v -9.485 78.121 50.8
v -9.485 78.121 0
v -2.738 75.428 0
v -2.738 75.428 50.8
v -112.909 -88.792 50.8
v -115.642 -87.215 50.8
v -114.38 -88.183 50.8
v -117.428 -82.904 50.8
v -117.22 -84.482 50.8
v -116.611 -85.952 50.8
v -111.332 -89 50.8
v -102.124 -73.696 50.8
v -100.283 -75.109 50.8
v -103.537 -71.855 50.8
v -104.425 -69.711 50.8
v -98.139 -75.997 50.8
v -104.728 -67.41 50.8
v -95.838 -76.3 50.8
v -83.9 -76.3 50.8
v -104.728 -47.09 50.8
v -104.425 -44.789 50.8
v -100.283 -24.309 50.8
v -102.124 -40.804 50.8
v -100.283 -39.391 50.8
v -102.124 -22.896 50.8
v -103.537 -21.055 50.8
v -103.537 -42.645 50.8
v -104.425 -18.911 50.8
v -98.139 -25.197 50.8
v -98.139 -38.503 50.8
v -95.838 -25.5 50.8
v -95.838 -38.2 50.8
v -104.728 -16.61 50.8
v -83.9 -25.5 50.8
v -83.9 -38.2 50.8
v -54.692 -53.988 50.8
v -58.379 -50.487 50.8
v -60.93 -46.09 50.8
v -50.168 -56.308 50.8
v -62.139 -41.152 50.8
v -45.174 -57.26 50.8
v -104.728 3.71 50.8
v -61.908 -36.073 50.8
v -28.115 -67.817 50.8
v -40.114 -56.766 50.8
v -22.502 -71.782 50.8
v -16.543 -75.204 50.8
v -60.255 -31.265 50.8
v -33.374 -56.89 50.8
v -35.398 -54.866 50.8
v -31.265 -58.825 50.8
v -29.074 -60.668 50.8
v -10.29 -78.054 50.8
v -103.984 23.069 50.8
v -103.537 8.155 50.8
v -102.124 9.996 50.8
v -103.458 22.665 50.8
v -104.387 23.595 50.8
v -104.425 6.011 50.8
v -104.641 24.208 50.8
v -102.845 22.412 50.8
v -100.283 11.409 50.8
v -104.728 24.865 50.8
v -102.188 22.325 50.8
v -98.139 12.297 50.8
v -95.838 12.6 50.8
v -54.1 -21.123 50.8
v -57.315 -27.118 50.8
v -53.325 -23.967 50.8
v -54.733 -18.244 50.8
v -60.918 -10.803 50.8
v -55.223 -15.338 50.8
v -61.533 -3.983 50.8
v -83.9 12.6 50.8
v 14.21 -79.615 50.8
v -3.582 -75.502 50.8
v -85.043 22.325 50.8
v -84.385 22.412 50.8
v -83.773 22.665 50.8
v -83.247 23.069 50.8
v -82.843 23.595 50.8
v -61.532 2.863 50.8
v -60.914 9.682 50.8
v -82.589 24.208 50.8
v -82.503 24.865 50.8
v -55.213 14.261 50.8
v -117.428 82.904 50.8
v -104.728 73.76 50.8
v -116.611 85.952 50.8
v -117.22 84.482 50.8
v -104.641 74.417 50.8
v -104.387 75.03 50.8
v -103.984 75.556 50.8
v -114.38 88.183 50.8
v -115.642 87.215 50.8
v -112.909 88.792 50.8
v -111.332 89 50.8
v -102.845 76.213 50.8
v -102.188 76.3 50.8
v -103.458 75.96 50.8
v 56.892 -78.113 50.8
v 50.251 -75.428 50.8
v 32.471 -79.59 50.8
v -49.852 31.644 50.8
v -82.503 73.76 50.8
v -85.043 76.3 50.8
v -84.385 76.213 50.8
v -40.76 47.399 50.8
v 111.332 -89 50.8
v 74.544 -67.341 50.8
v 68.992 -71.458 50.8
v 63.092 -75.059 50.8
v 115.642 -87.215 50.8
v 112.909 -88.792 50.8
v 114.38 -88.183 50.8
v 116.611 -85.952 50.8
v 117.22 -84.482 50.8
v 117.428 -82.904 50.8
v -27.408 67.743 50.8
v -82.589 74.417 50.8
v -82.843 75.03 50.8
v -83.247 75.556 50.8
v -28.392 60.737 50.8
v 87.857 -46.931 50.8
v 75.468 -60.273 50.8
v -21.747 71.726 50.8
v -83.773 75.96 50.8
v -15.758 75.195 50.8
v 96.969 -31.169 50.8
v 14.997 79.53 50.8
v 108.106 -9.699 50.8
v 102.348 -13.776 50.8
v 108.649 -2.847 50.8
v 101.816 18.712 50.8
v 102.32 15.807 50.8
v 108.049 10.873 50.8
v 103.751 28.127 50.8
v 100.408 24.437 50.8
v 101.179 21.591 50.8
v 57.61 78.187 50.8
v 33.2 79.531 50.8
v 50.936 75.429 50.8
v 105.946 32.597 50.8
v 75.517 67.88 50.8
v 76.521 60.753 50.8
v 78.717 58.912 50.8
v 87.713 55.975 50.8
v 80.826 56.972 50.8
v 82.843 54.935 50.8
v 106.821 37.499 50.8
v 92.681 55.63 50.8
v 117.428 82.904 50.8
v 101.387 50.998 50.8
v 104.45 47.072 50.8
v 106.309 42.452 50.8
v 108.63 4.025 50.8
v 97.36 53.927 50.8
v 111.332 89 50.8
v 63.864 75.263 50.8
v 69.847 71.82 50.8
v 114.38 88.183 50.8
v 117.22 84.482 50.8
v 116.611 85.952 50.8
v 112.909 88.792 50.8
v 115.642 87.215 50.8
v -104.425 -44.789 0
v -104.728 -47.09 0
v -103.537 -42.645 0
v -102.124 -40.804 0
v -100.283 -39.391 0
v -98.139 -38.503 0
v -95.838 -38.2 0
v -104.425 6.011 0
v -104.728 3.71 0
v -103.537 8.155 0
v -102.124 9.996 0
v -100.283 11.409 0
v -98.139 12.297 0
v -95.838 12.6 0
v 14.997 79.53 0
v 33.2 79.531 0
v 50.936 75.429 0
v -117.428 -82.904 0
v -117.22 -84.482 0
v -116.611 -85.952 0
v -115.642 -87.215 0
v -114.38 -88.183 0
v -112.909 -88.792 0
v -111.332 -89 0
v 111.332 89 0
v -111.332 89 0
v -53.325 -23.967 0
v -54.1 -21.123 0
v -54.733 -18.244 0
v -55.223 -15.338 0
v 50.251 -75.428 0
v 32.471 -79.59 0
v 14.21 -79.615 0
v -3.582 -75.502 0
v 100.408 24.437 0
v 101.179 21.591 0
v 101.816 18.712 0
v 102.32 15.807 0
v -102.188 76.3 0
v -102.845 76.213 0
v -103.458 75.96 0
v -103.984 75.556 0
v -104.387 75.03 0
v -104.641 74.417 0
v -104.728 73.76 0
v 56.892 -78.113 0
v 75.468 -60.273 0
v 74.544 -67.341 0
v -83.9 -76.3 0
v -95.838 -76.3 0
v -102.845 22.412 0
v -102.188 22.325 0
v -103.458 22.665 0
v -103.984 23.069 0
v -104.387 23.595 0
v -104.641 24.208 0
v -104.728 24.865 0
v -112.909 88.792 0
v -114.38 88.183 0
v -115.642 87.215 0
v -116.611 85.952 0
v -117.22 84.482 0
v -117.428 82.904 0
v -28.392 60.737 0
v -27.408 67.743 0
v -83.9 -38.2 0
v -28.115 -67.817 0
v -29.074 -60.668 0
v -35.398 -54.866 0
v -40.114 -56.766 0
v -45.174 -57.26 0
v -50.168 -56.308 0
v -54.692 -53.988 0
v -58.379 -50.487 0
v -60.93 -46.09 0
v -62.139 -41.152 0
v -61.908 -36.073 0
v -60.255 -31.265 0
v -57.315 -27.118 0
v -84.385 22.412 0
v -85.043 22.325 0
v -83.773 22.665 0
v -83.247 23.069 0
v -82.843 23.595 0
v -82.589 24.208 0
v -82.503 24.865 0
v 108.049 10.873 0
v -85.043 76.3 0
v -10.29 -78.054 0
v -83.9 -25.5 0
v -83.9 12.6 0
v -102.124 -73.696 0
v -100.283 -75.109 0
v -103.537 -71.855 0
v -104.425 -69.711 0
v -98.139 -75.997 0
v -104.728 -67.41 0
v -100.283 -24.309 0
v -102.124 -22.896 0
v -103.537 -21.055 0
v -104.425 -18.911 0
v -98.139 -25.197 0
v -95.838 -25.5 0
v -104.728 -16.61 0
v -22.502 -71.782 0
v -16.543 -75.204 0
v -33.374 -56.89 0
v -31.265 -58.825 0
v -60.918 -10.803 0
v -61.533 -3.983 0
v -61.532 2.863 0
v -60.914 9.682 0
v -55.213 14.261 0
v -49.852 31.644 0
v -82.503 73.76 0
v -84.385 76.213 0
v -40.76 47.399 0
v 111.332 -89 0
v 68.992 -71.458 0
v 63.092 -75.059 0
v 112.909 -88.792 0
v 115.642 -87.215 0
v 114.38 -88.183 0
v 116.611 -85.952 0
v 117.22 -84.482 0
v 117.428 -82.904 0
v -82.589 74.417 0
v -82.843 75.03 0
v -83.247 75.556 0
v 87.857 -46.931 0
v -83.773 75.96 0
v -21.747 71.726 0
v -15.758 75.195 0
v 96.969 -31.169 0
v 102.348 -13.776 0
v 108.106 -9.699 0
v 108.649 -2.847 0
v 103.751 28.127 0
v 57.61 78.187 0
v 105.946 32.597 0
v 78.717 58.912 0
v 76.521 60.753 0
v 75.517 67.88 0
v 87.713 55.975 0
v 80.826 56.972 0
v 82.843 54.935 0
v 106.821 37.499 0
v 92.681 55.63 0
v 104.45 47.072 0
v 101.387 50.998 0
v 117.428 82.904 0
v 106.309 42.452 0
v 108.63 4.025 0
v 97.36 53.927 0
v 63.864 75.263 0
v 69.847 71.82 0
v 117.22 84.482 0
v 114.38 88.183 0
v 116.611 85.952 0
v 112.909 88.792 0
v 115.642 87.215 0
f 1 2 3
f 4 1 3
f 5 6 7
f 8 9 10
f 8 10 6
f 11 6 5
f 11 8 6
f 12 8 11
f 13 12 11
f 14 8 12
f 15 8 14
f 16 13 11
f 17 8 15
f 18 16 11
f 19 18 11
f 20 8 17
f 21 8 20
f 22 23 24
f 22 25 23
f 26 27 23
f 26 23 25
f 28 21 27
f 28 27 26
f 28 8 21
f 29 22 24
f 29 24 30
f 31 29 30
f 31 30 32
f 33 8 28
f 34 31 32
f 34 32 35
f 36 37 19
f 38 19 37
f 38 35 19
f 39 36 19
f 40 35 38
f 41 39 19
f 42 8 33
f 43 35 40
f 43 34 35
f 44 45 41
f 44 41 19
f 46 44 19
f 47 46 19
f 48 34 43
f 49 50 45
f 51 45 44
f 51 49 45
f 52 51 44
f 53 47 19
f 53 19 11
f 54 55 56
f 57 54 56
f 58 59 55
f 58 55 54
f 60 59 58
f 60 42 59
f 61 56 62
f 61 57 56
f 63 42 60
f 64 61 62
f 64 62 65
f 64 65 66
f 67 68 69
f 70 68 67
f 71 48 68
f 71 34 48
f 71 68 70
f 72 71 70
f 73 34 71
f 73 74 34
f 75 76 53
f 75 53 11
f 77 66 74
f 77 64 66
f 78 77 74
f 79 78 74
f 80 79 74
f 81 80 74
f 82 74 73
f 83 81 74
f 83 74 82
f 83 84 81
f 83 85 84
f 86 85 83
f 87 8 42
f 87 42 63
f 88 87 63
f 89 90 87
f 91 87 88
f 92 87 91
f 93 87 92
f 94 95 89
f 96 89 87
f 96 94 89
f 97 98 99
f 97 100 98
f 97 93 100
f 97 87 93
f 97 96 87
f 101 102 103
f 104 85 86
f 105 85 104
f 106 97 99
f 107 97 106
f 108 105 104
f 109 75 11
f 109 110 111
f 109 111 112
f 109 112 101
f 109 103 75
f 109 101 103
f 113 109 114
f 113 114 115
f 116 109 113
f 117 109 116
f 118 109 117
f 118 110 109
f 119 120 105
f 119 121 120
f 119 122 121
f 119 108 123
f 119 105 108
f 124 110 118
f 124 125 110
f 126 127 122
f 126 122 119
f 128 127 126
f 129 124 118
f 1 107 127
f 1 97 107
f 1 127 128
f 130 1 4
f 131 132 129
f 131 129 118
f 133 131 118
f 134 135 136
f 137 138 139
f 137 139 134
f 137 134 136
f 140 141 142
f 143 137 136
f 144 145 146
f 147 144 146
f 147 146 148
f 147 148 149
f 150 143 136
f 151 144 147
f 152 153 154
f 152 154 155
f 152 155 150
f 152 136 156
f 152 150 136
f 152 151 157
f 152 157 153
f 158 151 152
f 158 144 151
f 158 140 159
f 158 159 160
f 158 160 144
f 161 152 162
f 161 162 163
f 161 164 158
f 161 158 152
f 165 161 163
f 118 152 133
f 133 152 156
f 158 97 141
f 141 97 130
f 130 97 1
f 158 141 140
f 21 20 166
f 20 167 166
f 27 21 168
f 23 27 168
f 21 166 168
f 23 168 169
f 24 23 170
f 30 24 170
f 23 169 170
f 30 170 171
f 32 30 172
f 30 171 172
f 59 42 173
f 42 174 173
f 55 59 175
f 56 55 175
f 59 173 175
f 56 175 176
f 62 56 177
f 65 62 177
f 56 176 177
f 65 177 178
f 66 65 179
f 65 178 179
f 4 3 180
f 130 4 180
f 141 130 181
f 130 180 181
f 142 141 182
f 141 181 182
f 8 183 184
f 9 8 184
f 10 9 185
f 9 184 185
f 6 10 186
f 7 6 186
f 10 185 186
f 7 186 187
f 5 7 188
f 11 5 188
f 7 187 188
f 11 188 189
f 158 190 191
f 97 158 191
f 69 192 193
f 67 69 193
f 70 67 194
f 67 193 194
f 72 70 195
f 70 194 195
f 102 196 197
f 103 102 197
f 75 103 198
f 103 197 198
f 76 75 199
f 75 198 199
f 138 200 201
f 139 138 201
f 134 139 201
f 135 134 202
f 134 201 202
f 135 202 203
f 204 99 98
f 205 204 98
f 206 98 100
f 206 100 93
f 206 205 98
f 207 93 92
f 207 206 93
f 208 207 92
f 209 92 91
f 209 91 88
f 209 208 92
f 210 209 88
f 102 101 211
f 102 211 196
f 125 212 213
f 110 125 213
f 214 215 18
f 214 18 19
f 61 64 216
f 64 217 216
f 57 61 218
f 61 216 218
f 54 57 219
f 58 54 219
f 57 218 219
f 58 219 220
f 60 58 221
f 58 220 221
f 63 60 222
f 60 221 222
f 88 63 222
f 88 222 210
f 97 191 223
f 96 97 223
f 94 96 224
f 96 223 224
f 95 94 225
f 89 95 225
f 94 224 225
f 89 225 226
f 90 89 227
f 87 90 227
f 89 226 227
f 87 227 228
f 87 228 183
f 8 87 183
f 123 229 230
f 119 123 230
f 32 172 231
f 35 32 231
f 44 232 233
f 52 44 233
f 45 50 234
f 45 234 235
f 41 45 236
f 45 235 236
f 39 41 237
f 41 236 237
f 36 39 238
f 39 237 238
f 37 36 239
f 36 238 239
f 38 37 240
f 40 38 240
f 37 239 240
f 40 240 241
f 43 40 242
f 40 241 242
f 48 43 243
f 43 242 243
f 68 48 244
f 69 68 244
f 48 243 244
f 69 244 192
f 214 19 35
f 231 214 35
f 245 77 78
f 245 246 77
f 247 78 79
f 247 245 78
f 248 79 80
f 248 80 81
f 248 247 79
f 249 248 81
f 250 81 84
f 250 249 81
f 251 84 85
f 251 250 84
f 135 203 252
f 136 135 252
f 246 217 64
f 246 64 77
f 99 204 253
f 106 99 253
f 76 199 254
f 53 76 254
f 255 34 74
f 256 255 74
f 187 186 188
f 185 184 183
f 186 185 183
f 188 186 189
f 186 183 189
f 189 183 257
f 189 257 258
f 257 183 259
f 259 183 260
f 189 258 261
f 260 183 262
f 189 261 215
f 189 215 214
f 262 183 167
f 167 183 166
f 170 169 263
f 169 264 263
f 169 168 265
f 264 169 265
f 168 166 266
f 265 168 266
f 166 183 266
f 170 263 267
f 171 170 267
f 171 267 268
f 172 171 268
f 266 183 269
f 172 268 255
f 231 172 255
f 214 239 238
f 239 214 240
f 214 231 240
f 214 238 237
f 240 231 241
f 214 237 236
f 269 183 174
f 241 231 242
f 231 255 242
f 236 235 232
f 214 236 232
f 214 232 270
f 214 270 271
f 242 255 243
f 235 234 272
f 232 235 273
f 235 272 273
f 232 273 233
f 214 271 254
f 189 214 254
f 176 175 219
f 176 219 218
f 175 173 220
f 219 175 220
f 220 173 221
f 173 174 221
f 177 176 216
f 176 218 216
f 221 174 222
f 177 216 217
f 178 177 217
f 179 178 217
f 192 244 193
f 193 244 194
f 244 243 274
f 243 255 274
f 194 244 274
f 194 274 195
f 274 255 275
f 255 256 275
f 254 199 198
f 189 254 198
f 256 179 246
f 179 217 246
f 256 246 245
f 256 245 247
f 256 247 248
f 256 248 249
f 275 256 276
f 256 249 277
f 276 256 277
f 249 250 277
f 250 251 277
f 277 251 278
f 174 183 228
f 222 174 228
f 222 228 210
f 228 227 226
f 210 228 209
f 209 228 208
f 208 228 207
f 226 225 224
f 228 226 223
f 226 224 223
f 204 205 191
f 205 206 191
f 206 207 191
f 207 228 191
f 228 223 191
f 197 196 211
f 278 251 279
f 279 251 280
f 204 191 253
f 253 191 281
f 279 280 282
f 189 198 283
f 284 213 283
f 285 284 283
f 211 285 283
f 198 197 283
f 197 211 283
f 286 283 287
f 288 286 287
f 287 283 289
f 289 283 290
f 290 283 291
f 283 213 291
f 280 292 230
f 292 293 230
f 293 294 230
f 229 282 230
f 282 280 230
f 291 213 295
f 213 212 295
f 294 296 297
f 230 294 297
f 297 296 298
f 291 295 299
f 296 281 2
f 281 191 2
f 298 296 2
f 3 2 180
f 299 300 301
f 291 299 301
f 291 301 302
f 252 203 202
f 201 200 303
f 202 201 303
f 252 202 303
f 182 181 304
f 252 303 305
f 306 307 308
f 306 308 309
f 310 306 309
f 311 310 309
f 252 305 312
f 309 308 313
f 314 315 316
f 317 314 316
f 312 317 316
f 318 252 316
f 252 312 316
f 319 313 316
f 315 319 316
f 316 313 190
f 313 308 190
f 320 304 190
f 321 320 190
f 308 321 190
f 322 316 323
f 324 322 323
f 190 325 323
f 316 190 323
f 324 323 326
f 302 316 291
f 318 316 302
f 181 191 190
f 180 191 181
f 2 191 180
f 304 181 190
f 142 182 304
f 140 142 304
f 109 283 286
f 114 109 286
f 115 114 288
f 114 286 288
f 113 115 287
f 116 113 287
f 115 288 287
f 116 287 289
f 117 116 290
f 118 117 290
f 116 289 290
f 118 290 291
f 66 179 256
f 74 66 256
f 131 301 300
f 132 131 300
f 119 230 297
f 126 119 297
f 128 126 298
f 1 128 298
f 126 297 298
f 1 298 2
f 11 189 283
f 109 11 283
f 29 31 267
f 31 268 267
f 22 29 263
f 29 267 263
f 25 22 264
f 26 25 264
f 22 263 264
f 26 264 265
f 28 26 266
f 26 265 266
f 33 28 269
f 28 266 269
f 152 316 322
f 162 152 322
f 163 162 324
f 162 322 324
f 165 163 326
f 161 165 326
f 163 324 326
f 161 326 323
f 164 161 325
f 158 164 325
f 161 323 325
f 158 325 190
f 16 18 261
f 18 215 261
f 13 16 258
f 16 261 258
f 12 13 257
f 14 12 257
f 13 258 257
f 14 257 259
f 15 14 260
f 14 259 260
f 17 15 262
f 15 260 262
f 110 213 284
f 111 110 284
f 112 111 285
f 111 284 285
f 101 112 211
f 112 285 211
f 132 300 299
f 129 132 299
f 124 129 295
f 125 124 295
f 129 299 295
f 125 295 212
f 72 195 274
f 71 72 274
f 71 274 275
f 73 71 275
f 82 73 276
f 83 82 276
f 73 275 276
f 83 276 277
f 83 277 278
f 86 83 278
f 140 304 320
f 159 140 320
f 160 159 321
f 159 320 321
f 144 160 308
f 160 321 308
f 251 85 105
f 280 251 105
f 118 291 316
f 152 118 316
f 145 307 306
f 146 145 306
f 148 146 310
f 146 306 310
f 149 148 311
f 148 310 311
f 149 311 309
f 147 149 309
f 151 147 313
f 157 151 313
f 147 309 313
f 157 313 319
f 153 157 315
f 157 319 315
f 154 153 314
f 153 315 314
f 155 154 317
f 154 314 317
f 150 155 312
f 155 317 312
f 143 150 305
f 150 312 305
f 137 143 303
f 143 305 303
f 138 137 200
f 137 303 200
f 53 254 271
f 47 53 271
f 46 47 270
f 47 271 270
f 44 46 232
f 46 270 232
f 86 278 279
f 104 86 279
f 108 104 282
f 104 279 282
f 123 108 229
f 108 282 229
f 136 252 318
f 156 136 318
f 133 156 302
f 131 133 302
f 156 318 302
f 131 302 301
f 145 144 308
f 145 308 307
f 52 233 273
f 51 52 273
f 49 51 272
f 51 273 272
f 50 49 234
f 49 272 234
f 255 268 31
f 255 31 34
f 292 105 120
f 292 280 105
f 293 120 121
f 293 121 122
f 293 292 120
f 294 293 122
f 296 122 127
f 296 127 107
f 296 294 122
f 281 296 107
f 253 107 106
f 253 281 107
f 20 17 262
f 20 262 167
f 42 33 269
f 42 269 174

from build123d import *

# Parameters (mm, degrees)
F1_DEPTH = 50.8
F2_W     = 20.828
F2_H     = 38.1
F3_DEPTH = 50.8
F4_W     = 22.225
F4_H     = 53.975
F5_DEPTH = 50.8
F6_R     = 8.89
F7_R     = 2.54


with BuildPart() as f1:
    # F0 (on Top) → F1 (new body)
    with BuildSketch(Plane.XY):
        with BuildLine():
            ThreePointArc((-111.331622, 89), (-115.642145, 87.214523), (-117.427622, 82.904))
            Line((-117.427622, 82.904), (-117.427622, -82.904))
            ThreePointArc((-117.427622, -82.904), (-115.642145, -87.214523), (-111.331622, -89))
            Line((-111.331622, -89), (111.331622, -89))
            ThreePointArc((111.331622, -89), (115.642145, -87.214523), (117.427622, -82.904))
            Line((117.427622, -82.904), (117.427622, 82.904))
            ThreePointArc((117.427622, 82.904), (115.642145, 87.214523), (111.331622, 89))
            Line((111.331622, 89), (-111.331622, 89))
        make_face()
        with BuildLine():
            ThreePointArc((-60.918022, -10.802655), (-61.609639, -0.559986), (-60.913995, 9.68241))
            Line((-60.913995, 9.68241), (-55.212554, 14.261207))
            ThreePointArc((-55.212554, 14.261207), (-45.748511, 39.77658), (-28.391702, 60.737103))
            Line((-28.391702, 60.737103), (-27.407633, 67.742944))
            ThreePointArc((-27.407633, 67.742944), (-18.790824, 73.526894), (-9.485241, 78.121416))
            Line((-9.485241, 78.121416), (-2.738388, 75.428307))
            ThreePointArc((-2.738388, 75.428307), (24.098624, 80.048241), (50.935831, 75.42944))
            Line((50.935831, 75.42944), (57.610091, 78.186609))
            ThreePointArc((57.610091, 78.186609), (66.892407, 73.605247), (75.516596, 67.880422))
            Line((75.516596, 67.880422), (76.520517, 60.753405))
            ThreePointArc((76.520517, 60.753405), (79.783196, 57.954312), (82.843276, 54.935057))
            ThreePointArc((82.843276, 54.935057), (104.449894, 47.071779), (100.407804, 24.436881))
            ThreePointArc((100.407804, 24.436881), (101.514269, 20.155202), (102.319921, 15.806873))
            Line((102.319921, 15.806873), (108.049072, 10.873495))
            ThreePointArc((108.049072, 10.873495), (108.709842, 0.589153), (108.105719, -9.698672))
            Line((108.105719, -9.698672), (102.348457, -13.775574))
            ThreePointArc((102.348457, -13.775574), (92.855411, -39.306001), (75.46826, -60.272823))
            Line((75.46826, -60.272823), (74.544008, -67.341163))
            ThreePointArc((74.544008, -67.341163), (66.082602, -73.324939), (56.891661, -78.113213))
            Line((56.891661, -78.113213), (50.250983, -75.428069))
            ThreePointArc((50.250983, -75.428069), (23.341097, -80.124901), (-3.581639, -75.502299))
            Line((-3.581639, -75.502299), (-10.28992, -78.054152))
            ThreePointArc((-10.28992, -78.054152), (-19.562426, -73.562391), (-28.115124, -67.817248))
            Line((-28.115124, -67.817248), (-29.074377, -60.66791))
            ThreePointArc((-29.074377, -60.66791), (-32.330068, -57.869325), (-35.398386, -54.86649))
            ThreePointArc((-35.398386, -54.86649), (-59.811696, -48.379935), (-53.325141, -23.966625))
            ThreePointArc((-53.325141, -23.966625), (-54.434448, -19.687429), (-55.222977, -15.337682))
            Line((-55.222977, -15.337682), (-60.918022, -10.802655))
        make_face(mode=Mode.SUBTRACT)
    extrude(amount=F1_DEPTH)

    # F2 (on face) → F3 (cut)
    with BuildSketch(Plane.XY.offset(50.8)):
        with Locations((-94.313622, -57.25)):
            Rectangle(F2_W, F2_H)
        with Locations((-94.313622, -6.45)):
            Rectangle(F2_W, F2_H)
    extrude(amount=-F3_DEPTH, mode=Mode.SUBTRACT)

    # F4 (on face) → F5 (cut)
    with BuildSketch(Plane.XY.offset(50.8)):
        with Locations((-93.615122, 49.3125)):
            Rectangle(F4_W, F4_H)
    extrude(amount=-F5_DEPTH, mode=Mode.SUBTRACT)

    # F6
    f6_edges = [f1.edges().sort_by_distance(p)[0] for p in [
        (-104.727622, 12.6, 25.4),
        (-104.727622, -38.2, 25.4),
        (-104.727622, -25.5, 25.4),
        (-104.727622, -76.3, 25.4),
    ]]
    fillet(f6_edges, radius=F6_R)

    # F7
    f7_edges = [f1.edges().sort_by_distance(p)[0] for p in [
        (-82.502622, 76.3, 25.4),
        (-104.727622, 76.3, 25.4),
        (-82.502622, 22.325, 25.4),
        (-104.727622, 22.325, 25.4),
    ]]
    fillet(f7_edges, radius=F7_R)


solid = f1.part
